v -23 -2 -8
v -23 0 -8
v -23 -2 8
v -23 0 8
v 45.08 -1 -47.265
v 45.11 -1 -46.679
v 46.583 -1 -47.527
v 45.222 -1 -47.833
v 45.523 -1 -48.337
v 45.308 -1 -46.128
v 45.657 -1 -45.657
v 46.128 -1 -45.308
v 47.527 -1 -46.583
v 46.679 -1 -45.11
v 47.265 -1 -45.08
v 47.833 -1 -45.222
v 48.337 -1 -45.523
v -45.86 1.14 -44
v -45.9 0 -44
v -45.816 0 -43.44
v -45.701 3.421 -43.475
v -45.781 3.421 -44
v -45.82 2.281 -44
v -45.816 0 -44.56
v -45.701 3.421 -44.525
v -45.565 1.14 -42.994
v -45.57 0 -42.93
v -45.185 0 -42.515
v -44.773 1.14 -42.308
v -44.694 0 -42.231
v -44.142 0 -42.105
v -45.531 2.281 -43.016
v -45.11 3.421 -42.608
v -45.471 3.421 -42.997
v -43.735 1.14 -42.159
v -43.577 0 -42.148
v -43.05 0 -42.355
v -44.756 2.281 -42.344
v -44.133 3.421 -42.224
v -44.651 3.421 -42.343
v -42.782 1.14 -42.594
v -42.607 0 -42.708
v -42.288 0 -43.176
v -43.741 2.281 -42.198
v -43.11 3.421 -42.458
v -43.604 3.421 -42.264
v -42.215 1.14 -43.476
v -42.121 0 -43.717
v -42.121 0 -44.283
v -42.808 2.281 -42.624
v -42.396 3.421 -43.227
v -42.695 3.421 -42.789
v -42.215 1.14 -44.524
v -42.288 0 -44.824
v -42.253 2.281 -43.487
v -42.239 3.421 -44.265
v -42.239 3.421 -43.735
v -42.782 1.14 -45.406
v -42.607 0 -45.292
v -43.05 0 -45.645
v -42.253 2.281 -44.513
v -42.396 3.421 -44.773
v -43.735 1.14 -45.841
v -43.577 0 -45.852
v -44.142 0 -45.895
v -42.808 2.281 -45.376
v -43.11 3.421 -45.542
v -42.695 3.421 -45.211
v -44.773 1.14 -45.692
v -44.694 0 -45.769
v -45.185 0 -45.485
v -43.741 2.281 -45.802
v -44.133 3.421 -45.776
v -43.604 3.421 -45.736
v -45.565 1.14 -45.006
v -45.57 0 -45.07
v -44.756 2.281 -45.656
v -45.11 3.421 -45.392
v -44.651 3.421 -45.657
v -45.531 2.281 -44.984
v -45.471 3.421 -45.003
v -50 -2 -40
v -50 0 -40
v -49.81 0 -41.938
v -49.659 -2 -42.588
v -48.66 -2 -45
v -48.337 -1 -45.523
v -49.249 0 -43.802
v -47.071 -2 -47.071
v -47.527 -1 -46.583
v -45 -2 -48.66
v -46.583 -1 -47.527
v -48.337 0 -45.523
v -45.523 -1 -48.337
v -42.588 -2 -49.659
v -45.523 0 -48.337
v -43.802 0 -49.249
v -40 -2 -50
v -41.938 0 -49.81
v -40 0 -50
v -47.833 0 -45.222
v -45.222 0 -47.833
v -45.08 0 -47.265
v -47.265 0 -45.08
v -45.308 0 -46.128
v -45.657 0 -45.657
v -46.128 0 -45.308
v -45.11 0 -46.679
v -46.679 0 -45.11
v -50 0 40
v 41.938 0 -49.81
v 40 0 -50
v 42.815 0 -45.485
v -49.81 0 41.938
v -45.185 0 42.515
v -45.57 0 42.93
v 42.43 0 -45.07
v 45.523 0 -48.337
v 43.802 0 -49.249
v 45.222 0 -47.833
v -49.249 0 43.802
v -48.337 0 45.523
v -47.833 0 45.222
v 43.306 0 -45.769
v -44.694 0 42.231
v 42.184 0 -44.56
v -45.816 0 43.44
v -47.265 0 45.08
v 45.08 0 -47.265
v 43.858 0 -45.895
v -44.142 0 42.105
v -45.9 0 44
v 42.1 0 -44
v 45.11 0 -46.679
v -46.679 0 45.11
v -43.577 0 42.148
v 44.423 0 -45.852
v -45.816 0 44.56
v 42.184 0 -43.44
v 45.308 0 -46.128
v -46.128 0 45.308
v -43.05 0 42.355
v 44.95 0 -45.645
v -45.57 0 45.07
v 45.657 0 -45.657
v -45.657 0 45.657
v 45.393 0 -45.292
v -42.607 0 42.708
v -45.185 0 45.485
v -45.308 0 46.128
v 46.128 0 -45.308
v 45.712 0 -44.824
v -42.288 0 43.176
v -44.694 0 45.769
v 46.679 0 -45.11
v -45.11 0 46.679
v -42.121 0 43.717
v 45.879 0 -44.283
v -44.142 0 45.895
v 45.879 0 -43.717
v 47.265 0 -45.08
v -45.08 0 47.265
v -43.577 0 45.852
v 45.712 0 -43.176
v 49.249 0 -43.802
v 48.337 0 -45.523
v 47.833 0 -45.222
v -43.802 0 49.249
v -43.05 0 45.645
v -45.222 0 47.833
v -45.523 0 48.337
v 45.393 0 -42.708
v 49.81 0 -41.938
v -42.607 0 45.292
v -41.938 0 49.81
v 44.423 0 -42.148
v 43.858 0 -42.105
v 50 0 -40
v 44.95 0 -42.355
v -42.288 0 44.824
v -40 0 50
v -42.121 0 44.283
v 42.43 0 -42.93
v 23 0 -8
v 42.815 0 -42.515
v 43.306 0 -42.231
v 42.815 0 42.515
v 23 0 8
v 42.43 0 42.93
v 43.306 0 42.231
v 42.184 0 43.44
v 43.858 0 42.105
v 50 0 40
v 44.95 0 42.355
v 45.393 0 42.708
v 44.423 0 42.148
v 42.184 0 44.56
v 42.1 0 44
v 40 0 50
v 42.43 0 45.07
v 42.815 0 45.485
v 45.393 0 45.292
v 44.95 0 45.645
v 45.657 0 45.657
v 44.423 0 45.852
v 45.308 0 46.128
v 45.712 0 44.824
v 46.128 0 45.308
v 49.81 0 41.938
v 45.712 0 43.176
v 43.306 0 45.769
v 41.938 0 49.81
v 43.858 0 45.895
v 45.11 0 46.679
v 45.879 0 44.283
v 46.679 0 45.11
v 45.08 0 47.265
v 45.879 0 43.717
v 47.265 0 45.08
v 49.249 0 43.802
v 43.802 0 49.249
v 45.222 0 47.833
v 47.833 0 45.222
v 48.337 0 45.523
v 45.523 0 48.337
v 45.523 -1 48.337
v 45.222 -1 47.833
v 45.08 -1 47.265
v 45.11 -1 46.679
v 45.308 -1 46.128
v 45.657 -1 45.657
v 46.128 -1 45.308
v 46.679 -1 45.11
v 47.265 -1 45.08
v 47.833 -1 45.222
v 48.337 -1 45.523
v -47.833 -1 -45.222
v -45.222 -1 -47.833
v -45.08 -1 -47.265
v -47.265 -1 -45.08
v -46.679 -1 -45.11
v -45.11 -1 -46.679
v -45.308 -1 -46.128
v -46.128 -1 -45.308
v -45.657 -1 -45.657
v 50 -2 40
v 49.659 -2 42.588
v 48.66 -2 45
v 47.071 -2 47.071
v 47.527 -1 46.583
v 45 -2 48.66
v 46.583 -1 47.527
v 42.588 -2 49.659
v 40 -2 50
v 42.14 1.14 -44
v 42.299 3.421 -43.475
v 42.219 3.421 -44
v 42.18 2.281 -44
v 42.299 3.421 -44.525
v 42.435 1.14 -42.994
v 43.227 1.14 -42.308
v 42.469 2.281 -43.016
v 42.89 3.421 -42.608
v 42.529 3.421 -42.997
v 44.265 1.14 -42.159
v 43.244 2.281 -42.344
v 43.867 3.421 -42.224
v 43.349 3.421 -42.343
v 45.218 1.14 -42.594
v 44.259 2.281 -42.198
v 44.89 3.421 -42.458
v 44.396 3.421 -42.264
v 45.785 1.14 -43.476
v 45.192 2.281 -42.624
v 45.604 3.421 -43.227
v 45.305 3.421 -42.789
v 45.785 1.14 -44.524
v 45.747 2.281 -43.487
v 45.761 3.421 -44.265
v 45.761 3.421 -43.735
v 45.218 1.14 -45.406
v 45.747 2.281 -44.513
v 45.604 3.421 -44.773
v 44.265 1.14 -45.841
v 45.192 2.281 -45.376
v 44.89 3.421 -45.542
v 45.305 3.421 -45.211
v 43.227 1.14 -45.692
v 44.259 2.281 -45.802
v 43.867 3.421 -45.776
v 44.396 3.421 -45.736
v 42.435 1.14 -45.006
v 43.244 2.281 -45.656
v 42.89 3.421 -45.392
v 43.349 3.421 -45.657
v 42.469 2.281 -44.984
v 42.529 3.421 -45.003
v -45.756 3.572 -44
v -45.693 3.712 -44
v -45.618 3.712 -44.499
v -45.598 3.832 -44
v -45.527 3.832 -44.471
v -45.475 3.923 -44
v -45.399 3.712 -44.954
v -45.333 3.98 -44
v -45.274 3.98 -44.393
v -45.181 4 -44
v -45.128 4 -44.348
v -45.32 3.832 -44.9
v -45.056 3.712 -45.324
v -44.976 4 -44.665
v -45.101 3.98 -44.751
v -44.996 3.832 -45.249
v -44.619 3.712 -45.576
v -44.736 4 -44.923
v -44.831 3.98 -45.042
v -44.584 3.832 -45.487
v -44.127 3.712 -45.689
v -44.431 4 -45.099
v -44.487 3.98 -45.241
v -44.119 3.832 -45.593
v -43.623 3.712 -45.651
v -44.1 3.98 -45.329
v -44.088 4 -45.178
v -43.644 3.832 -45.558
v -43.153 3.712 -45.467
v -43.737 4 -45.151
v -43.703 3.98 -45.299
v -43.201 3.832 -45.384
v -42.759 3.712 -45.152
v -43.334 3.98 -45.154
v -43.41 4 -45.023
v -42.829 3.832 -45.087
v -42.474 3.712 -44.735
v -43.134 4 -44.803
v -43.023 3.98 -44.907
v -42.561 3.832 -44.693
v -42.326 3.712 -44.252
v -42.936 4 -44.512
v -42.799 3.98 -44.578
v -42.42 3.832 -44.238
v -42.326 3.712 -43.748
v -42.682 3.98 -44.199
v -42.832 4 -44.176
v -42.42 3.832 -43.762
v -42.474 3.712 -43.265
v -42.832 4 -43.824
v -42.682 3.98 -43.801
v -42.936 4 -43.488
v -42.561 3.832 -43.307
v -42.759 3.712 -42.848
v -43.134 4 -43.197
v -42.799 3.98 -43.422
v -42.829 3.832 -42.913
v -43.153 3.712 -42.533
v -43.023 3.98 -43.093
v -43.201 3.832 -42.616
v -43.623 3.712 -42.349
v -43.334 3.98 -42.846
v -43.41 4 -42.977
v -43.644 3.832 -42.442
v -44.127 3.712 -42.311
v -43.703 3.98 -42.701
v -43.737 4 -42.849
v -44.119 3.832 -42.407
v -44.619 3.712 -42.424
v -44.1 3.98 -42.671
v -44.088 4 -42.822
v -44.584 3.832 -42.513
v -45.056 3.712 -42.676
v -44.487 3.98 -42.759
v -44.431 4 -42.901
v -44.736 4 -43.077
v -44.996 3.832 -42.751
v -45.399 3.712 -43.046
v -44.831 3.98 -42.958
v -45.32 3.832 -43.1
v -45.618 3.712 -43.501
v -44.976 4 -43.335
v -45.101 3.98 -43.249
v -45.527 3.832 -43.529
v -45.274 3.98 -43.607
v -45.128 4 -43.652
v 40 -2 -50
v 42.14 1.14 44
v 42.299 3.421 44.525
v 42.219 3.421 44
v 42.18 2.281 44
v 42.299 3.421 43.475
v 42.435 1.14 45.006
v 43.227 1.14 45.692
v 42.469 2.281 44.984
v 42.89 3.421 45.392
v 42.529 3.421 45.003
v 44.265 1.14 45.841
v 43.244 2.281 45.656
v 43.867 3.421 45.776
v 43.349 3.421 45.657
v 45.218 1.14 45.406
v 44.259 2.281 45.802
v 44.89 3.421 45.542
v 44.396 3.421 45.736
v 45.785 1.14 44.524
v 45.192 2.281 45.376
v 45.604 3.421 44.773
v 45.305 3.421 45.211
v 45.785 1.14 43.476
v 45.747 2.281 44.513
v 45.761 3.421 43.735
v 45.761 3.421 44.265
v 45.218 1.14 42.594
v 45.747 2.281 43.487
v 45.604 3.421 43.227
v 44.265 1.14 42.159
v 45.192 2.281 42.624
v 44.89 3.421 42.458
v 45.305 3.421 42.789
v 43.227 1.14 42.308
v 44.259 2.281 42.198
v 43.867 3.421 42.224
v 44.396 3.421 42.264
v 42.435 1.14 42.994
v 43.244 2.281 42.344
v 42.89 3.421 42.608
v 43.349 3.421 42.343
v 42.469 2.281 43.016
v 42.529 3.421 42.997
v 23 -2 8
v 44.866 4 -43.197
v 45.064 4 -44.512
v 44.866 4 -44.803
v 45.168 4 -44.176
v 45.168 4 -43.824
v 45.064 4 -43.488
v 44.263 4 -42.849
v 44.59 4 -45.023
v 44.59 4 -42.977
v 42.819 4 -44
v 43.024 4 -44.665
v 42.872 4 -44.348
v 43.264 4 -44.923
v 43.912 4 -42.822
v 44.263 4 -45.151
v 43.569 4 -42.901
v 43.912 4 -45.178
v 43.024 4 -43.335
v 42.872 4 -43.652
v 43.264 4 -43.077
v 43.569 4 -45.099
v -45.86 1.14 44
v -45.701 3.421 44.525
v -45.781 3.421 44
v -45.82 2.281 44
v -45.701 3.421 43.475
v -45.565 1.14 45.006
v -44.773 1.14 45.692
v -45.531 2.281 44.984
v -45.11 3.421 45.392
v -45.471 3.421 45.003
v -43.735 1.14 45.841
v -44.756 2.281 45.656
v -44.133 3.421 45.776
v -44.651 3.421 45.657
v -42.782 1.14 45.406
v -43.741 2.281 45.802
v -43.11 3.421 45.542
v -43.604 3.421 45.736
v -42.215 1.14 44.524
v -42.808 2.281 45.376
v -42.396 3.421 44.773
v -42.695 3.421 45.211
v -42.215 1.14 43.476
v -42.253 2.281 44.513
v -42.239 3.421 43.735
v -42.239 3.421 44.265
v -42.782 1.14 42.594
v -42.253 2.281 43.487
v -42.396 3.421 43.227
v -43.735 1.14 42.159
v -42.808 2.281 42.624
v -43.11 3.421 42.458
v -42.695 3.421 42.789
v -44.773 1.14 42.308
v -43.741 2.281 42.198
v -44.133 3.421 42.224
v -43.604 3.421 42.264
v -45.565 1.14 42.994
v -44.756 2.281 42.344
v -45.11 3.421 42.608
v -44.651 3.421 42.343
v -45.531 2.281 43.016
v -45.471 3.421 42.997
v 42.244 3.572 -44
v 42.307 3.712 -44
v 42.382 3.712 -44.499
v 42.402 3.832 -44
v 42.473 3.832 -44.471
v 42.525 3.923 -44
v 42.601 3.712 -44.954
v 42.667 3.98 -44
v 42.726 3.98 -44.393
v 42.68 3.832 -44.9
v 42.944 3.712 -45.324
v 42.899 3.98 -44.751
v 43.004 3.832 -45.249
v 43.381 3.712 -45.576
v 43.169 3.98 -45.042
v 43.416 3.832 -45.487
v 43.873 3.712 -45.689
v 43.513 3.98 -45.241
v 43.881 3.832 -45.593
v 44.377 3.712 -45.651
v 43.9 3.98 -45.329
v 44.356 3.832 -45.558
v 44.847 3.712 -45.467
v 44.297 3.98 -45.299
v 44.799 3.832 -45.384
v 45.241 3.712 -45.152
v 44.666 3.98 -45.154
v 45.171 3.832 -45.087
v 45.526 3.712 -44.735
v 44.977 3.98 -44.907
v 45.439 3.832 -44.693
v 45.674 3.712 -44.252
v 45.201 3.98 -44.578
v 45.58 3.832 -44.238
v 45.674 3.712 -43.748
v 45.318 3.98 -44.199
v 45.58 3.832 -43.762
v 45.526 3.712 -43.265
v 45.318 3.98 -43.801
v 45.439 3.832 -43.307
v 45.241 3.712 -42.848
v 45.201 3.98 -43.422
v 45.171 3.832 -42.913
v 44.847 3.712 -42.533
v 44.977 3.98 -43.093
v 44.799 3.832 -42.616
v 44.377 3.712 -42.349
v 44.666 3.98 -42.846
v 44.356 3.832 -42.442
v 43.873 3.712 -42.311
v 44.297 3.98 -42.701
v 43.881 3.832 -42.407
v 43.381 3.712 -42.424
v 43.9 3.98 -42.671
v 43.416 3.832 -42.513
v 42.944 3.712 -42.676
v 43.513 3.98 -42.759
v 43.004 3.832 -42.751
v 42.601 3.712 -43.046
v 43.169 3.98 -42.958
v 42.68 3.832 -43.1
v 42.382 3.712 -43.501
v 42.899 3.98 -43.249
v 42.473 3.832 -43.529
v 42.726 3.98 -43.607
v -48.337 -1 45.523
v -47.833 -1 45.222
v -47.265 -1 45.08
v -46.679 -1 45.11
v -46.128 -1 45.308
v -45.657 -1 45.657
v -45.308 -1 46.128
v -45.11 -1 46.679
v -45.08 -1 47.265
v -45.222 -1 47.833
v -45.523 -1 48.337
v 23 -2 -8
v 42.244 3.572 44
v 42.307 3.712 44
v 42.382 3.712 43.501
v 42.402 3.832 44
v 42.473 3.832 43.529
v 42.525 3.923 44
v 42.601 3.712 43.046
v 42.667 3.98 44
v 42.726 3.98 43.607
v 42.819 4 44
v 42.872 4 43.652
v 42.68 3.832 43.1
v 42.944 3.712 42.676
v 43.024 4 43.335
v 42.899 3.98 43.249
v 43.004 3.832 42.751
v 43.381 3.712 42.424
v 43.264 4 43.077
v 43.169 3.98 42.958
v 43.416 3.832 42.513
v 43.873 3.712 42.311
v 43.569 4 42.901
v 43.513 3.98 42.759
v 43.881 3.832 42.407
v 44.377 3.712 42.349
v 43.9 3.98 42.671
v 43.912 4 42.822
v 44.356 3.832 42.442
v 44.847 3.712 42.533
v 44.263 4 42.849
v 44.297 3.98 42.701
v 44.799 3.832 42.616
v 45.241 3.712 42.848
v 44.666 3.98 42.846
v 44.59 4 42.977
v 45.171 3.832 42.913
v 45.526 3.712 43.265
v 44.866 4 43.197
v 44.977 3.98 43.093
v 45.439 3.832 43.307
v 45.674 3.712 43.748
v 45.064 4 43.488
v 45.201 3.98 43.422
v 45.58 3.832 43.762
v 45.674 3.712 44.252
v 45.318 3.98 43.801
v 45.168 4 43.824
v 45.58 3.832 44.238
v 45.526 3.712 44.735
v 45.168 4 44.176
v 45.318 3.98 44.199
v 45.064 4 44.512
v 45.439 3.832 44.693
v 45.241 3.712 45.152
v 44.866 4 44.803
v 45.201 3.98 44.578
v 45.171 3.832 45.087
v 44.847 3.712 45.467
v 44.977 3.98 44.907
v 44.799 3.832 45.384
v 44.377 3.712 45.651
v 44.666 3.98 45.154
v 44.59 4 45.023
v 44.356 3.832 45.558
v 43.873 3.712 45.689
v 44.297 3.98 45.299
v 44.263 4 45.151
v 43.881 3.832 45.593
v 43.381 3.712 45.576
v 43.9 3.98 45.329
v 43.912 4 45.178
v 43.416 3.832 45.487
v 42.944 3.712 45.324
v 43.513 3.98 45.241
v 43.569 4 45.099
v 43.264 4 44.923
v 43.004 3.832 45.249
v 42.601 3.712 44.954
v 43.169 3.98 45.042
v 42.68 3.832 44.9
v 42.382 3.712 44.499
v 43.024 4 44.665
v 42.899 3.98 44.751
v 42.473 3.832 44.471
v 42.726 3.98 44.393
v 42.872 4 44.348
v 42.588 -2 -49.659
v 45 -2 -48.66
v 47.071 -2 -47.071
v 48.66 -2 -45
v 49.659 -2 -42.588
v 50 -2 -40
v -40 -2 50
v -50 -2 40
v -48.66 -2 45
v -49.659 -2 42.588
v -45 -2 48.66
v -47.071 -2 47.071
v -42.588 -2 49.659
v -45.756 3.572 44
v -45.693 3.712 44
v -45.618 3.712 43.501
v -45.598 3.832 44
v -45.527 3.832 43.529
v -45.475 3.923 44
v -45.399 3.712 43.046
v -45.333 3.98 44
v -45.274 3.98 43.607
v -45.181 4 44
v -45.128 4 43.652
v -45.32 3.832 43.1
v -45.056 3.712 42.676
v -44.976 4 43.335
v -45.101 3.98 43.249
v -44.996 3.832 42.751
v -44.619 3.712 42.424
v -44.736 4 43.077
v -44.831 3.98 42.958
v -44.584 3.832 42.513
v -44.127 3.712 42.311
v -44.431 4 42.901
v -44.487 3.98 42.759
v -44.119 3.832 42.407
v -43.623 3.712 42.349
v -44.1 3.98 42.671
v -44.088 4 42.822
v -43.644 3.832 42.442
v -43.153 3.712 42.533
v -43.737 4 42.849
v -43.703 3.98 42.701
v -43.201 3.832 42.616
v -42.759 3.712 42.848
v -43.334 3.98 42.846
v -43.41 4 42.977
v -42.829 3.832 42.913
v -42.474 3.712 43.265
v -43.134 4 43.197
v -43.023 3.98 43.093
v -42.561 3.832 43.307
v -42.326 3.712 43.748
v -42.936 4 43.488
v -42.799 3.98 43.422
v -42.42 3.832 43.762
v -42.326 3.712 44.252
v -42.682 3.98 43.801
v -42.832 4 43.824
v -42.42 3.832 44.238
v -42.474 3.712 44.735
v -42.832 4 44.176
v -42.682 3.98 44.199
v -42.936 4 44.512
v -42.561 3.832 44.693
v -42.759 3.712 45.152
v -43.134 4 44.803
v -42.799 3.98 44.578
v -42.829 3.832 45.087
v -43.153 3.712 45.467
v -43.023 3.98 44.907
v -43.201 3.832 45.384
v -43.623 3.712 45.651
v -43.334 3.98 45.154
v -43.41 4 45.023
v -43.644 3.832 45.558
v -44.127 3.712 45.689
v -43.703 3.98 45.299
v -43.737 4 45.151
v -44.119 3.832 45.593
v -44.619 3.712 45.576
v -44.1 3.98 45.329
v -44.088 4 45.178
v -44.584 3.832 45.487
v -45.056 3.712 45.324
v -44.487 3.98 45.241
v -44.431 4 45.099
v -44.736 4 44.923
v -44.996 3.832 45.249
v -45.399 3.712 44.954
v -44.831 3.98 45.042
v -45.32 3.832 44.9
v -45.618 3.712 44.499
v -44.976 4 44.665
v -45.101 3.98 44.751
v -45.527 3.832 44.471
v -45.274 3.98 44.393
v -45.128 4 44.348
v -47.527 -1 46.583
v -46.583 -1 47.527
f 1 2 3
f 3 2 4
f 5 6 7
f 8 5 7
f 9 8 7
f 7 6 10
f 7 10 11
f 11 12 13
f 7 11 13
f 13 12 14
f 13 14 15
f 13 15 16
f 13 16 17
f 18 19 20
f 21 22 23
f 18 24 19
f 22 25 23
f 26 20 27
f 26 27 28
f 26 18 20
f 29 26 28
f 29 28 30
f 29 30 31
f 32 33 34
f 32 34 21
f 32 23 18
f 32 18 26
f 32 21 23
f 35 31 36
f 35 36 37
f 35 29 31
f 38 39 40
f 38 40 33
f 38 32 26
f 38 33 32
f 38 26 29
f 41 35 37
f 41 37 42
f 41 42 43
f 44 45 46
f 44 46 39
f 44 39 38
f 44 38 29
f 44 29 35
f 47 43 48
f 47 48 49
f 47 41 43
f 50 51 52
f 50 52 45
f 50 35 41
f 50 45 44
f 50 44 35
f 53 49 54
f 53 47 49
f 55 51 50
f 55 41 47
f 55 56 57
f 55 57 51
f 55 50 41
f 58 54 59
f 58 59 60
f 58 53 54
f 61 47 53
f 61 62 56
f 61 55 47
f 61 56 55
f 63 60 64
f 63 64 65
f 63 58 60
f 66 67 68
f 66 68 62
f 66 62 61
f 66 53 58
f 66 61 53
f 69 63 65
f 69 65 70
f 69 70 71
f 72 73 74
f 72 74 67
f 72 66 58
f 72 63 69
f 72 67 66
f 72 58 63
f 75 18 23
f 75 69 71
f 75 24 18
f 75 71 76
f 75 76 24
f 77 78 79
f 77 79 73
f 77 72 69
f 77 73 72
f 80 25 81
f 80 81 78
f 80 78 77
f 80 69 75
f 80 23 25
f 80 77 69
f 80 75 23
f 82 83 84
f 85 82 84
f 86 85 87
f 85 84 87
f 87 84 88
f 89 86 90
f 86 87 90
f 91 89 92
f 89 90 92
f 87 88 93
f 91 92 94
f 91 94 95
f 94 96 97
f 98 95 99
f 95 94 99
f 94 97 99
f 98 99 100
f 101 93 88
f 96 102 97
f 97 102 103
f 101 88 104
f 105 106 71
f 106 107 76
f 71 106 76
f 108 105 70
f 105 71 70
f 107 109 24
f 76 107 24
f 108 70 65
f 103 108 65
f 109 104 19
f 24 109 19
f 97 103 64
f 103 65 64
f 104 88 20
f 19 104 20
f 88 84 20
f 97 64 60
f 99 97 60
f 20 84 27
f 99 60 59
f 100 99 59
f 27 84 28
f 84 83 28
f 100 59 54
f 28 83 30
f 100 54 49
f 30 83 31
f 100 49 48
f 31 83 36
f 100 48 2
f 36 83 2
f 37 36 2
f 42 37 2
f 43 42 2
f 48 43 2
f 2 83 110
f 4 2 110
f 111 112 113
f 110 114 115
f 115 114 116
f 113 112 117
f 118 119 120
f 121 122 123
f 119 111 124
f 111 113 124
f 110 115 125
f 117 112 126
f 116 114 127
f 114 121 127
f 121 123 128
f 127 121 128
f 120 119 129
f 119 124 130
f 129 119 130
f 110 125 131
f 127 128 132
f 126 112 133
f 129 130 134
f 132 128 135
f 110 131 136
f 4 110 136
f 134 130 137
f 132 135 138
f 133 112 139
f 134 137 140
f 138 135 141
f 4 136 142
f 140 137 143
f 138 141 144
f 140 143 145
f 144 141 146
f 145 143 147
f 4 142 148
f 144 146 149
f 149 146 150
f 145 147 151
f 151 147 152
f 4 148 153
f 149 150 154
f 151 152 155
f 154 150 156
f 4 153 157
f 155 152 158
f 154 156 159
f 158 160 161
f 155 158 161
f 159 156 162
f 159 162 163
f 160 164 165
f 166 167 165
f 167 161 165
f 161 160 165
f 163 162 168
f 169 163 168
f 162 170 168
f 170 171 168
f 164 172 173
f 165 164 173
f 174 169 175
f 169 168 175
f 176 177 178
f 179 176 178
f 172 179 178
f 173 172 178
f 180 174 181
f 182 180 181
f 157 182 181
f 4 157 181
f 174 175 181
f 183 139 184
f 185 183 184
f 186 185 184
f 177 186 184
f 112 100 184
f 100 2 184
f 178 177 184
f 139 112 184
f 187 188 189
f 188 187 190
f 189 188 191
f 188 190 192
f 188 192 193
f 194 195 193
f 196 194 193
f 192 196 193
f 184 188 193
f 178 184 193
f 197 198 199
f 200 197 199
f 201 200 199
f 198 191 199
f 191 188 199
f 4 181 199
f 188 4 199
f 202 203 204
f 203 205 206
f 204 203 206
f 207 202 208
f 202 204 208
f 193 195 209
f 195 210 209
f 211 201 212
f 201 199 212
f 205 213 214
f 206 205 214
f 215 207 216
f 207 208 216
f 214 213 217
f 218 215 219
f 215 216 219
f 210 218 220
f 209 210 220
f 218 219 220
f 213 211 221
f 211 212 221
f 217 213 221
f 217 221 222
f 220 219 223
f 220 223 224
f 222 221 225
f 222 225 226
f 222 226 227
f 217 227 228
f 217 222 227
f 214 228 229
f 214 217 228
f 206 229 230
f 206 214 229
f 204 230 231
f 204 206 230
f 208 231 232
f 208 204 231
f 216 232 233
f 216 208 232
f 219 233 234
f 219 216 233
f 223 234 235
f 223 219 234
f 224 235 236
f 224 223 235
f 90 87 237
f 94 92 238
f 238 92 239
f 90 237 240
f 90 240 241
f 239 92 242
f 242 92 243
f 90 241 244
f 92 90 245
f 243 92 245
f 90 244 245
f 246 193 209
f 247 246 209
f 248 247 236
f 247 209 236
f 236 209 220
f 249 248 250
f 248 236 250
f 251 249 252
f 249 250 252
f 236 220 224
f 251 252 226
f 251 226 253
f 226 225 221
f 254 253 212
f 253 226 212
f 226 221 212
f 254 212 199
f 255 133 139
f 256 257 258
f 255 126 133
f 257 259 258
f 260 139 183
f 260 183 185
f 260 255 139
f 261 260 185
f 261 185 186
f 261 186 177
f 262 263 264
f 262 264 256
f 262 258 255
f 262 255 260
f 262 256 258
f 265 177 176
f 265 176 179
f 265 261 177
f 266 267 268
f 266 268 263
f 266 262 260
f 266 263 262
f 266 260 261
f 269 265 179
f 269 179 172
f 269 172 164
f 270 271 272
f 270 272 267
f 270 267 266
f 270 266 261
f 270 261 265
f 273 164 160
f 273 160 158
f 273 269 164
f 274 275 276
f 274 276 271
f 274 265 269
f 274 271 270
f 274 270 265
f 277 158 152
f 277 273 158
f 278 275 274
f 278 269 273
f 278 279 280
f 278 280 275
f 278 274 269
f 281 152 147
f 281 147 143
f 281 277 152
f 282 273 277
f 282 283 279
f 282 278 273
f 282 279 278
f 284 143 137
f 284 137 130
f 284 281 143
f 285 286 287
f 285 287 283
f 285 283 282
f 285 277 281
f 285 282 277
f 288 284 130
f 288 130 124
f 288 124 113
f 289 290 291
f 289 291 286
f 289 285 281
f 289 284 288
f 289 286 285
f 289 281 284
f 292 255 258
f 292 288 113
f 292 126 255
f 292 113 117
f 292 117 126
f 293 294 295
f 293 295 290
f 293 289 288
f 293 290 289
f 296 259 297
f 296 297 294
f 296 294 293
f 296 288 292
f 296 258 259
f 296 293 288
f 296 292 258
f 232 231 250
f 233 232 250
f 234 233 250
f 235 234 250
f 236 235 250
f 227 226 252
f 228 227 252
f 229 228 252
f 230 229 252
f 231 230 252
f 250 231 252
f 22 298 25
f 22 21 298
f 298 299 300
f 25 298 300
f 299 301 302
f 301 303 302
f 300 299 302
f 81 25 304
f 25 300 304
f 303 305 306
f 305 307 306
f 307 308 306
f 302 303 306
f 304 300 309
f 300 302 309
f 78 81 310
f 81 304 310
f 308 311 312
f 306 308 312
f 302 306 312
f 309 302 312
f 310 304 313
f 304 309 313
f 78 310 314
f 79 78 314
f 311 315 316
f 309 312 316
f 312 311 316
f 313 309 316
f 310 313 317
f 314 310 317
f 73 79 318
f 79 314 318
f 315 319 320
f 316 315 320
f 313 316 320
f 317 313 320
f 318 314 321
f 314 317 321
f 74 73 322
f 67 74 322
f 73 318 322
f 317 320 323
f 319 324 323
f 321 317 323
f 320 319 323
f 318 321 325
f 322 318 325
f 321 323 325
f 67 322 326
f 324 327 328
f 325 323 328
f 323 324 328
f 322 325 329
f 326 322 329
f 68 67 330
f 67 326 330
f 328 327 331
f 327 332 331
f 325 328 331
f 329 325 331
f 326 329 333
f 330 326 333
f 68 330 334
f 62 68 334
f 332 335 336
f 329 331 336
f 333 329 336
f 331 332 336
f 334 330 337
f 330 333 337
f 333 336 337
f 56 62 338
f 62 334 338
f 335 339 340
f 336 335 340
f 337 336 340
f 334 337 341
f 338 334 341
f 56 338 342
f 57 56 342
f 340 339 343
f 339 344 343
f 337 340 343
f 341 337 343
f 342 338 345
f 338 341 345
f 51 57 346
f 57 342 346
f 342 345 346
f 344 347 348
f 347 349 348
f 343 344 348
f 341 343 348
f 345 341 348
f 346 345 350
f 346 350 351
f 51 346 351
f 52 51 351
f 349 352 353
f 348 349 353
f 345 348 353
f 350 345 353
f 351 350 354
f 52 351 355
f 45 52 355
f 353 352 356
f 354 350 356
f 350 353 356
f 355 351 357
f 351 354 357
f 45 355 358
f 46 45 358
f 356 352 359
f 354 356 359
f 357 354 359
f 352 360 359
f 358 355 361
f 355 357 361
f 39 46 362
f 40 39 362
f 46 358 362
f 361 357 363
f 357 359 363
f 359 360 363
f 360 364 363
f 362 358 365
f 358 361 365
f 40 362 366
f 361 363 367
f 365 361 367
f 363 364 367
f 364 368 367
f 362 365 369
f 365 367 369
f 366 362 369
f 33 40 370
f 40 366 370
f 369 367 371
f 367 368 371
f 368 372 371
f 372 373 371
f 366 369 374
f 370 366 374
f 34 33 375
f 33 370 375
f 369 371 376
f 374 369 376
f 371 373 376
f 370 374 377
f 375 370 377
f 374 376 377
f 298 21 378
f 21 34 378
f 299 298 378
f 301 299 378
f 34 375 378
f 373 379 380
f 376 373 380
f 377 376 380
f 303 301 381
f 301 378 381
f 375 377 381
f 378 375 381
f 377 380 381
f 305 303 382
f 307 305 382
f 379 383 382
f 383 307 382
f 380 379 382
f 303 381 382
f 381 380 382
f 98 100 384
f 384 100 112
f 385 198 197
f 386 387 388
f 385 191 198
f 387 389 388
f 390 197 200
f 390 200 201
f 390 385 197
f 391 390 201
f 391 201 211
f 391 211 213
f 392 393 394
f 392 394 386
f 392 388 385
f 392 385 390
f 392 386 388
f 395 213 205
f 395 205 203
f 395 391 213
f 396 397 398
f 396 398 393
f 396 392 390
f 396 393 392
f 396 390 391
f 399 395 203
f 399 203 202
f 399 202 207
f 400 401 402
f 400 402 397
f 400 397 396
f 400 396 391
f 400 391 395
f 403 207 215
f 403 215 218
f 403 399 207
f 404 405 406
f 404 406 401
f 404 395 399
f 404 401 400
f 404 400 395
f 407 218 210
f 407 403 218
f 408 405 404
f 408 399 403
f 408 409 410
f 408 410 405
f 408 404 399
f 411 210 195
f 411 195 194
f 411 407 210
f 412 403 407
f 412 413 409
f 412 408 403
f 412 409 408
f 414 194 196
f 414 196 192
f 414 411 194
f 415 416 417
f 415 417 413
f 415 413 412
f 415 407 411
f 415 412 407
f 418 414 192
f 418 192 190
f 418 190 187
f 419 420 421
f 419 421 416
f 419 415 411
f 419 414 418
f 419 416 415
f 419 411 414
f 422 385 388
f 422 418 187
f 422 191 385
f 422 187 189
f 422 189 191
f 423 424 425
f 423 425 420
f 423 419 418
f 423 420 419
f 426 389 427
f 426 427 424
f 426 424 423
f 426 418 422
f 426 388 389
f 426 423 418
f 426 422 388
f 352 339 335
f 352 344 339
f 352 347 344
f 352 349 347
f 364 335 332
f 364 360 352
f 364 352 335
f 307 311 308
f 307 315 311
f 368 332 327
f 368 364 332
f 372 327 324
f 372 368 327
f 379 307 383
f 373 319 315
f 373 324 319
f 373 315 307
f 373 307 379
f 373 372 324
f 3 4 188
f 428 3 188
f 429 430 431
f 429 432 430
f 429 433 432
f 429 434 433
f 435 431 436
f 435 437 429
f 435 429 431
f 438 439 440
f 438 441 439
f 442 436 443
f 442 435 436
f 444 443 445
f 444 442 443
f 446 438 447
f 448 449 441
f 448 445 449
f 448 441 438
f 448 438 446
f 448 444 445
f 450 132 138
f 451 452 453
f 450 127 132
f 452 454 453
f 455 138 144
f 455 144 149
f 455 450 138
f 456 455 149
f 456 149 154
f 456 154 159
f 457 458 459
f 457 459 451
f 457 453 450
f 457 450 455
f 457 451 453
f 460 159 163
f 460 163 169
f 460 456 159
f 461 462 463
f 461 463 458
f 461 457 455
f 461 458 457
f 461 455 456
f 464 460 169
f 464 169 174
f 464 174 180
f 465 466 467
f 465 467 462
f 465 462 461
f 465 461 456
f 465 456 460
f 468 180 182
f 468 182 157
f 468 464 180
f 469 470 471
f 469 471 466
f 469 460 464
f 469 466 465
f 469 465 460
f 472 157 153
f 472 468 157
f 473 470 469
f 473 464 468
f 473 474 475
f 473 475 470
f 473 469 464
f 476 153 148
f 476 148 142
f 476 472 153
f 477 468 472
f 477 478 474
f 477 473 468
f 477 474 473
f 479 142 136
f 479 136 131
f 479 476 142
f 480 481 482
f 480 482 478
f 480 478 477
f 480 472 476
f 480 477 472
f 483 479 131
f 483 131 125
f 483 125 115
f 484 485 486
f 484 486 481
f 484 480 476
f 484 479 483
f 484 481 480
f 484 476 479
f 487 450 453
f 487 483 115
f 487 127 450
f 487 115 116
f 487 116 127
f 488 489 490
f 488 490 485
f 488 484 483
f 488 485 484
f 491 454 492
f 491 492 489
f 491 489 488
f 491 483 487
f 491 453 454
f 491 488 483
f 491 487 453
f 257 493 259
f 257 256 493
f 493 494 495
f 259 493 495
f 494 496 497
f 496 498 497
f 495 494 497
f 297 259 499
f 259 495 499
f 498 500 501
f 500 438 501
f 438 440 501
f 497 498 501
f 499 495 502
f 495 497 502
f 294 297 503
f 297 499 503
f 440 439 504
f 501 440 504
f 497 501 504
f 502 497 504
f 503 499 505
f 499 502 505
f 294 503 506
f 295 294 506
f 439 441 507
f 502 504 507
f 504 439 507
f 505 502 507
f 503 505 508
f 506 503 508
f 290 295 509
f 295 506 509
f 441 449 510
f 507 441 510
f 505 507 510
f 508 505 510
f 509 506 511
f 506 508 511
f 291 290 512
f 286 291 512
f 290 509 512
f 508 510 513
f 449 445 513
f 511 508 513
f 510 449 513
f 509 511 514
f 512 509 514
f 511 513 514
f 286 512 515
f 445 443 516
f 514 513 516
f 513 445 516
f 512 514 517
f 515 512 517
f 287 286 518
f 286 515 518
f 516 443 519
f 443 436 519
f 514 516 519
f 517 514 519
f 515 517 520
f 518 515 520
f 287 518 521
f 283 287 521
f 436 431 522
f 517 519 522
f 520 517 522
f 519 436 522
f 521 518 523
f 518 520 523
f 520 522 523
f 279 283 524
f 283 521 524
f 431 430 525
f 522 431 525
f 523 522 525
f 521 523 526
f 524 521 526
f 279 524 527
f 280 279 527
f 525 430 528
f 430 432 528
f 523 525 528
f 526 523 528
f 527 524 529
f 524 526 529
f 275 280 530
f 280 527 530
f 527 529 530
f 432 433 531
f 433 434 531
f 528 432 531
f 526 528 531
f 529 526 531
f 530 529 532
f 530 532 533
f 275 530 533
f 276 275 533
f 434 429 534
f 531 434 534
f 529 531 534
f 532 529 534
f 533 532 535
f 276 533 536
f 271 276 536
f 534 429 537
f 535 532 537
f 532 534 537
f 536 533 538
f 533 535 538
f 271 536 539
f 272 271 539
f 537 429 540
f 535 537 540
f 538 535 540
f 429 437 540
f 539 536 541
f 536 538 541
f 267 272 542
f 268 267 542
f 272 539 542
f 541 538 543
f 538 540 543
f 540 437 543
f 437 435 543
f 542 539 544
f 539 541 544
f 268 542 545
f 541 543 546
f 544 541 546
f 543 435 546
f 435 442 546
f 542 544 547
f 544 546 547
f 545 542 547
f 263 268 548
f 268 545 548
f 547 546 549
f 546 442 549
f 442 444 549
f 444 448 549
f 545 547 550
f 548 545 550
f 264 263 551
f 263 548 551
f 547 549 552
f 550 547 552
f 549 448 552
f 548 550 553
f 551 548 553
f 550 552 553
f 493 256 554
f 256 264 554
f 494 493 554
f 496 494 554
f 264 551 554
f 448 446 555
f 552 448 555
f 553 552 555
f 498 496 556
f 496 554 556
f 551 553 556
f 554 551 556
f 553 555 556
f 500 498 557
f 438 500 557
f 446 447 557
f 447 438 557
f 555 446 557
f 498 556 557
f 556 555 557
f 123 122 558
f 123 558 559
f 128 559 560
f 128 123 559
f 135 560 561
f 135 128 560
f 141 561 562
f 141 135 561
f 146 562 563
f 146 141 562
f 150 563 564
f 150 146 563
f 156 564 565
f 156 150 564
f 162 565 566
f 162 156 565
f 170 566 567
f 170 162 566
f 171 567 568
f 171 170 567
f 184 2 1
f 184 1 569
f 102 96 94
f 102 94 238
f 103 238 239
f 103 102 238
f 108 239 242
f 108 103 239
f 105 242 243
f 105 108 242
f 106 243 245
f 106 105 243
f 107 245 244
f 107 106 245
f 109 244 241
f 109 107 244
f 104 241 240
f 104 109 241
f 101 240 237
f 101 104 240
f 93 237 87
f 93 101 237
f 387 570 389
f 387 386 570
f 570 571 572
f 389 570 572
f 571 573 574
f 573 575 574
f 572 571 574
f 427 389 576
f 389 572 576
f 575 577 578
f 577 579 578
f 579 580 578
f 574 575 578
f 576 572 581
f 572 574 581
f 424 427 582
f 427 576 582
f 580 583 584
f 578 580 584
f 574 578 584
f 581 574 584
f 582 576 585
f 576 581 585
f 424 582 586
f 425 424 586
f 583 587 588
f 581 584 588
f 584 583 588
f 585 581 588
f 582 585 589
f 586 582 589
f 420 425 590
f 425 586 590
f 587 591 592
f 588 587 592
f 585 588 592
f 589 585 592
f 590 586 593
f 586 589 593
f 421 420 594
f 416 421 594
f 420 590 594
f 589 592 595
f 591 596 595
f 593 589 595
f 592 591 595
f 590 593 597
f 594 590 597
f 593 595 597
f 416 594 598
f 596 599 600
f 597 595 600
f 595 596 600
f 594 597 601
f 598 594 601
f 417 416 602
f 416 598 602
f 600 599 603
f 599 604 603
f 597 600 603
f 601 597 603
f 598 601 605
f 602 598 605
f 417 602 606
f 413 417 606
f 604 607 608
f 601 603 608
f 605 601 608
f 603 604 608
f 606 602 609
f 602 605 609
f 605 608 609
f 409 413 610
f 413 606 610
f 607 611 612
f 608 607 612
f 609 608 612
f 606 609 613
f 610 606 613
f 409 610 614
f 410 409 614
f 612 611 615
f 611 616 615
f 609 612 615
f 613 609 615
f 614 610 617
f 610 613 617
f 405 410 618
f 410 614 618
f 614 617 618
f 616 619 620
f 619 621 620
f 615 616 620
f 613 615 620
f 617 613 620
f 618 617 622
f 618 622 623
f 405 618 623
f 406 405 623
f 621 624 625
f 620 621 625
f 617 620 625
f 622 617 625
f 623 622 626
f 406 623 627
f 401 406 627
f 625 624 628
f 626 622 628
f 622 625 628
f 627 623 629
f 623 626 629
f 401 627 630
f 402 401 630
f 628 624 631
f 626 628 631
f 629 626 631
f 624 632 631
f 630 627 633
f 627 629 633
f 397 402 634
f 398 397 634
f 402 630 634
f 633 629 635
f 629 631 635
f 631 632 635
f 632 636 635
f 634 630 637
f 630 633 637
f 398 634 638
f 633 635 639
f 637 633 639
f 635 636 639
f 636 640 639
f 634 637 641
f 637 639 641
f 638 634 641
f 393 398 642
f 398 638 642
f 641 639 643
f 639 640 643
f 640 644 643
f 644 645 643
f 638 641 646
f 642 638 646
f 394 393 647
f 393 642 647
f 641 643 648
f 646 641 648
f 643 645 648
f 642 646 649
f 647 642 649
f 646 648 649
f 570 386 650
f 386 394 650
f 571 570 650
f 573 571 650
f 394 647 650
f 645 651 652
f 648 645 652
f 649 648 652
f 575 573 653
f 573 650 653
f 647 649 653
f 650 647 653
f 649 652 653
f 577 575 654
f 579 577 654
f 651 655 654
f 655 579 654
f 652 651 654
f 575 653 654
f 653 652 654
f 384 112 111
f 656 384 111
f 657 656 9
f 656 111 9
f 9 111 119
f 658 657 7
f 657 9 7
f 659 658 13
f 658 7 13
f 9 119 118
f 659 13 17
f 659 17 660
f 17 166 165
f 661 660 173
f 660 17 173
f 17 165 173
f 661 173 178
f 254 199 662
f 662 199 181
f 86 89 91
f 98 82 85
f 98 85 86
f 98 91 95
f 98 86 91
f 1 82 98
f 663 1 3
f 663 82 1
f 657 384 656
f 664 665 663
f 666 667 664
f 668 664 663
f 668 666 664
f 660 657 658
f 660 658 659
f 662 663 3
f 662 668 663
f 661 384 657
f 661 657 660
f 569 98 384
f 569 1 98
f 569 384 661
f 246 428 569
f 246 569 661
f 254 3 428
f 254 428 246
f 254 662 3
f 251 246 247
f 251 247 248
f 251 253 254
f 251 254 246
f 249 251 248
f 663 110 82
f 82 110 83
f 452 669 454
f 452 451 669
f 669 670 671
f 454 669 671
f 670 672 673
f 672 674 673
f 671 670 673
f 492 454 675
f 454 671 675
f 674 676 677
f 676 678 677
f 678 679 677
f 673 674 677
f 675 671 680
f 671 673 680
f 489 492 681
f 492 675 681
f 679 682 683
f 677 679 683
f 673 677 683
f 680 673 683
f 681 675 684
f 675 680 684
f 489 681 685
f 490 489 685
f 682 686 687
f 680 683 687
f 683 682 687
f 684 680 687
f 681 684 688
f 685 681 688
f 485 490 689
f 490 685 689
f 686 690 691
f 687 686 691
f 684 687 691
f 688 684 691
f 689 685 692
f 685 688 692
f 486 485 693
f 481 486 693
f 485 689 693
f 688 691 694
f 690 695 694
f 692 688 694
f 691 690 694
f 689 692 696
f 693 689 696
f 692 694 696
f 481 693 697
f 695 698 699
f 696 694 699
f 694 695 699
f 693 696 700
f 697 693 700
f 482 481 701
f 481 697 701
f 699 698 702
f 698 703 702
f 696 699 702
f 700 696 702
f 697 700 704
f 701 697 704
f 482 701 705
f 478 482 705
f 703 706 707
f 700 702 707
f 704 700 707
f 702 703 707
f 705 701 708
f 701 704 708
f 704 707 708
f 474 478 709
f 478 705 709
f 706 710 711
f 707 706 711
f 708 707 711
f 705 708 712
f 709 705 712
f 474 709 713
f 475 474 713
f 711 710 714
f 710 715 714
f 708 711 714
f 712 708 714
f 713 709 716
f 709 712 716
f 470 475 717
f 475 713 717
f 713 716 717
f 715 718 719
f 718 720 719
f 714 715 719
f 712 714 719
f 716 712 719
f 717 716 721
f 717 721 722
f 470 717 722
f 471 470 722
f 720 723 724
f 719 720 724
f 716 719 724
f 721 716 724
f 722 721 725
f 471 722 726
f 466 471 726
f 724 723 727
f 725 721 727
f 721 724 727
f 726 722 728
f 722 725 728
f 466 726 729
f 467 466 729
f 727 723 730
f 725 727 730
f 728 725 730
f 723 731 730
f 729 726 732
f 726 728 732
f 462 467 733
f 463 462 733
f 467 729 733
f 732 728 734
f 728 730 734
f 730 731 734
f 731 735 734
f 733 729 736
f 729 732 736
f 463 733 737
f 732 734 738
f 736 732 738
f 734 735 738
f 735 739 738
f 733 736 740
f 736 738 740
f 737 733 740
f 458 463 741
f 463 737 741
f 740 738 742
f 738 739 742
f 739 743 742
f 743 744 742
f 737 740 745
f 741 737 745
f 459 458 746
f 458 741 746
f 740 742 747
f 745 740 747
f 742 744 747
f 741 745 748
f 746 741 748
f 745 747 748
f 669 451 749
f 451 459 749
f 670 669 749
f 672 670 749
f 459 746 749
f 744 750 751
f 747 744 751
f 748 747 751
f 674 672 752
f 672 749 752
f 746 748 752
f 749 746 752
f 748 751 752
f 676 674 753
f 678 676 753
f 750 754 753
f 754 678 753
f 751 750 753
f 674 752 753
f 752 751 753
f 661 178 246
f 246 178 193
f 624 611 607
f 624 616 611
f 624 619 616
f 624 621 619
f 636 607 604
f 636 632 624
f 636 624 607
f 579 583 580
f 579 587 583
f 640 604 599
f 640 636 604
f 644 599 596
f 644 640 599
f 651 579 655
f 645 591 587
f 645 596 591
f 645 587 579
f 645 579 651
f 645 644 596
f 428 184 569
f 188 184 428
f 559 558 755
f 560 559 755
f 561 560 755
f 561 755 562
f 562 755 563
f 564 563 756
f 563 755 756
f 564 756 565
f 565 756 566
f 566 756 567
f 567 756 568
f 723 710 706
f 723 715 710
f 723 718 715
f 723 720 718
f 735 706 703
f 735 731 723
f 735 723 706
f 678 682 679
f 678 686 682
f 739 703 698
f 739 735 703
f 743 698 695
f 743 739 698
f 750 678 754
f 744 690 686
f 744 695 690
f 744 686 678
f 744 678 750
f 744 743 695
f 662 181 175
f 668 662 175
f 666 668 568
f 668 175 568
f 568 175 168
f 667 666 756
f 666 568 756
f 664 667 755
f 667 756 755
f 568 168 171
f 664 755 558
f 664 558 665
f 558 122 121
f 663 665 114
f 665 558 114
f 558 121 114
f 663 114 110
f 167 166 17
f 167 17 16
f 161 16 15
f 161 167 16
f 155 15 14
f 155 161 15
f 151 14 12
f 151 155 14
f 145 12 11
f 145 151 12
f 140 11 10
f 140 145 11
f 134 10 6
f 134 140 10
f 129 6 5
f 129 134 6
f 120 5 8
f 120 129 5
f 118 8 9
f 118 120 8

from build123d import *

# Parameters (mm, degrees)
F0_W     = 46
F0_H     = 16
F1_DEPTH = 2
F2_R     = 1.9
F3_DEPTH = 4
F3_TAPER = 2
F5_DEPTH = 1
F6_R     = 0.6


# Not quite as in the source:
# - a feature names something its author has since deleted; it is built from what else it names


with BuildPart() as f1:
    # F0 (on Front) → F1 (new body)
    with BuildSketch(Plane.XZ):
        Polygon((-40, -50), (40, -50), (40, -40), (50, -40), (50, 40), (40, 40), (40, 50), (-40, 50), (-40, 40), (-50, 40), (-50, -40), (-40, -40), align=None)
        Rectangle(F0_W, F0_H, mode=Mode.SUBTRACT)
        with BuildLine():
            Line((40, -40), (40, -50))
            ThreePointArc((40, -50), (47.0710678119, -47.0710678119), (50, -40))
            Line((50, -40), (40, -40))
        make_face()
        with BuildLine():
            ThreePointArc((-50, -40), (-47.0710678119, -47.0710678119), (-40, -50))
            Line((-40, -50), (-40, -40))
            Line((-40, -40), (-50, -40))
        make_face()
        with BuildLine():
            Line((40, 40), (50, 40))
            ThreePointArc((50, 40), (47.0710678119, 47.0710678119), (40, 50))
            Line((40, 50), (40, 40))
        make_face()
        with BuildLine():
            ThreePointArc((-40, 50), (-47.0710678119, 47.0710678119), (-50, 40))
            Line((-50, 40), (-40, 40))
            Line((-40, 40), (-40, 50))
        make_face()
    extrude(amount=F1_DEPTH)

    # F2 (on face) → F3 (join)
    with BuildSketch(Plane(origin=(0, 0, 0), x_dir=(-1, 0, 0), z_dir=(0, 1, 0))):
        with Locations((-44, 44)):
            Circle(F2_R)
        with Locations((44, 44)):
            Circle(F2_R)
        with Locations((-44, -44)):
            Circle(F2_R)
        with Locations((44, -44)):
            Circle(F2_R)
    extrude(amount=F3_DEPTH, taper=F3_TAPER)

    # F4 (on face) → F5 (cut)
    with BuildSketch(Plane.XZ):
        with BuildLine():
            ThreePointArc((48.3367711836, 45.5225217277), (47.0710678119, 47.0710678119), (45.5225217277, 48.3367711836))
            ThreePointArc((45.5225217277, 48.3367711836), (45.6568542495, 45.6568542495), (48.3367711836, 45.5225217277))
        make_face()
        with BuildLine():
            ThreePointArc((-48.3367711836, 45.5225217277), (-45.6568542495, 45.6568542495), (-45.5225217277, 48.3367711836))
            ThreePointArc((-45.5225217277, 48.3367711836), (-47.0710678119, 47.0710678119), (-48.3367711836, 45.5225217277))
        make_face()
        with BuildLine():
            ThreePointArc((-48.3367711836, -45.5225217277), (-47.0710678119, -47.0710678119), (-45.5225217277, -48.3367711836))
            ThreePointArc((-45.5225217277, -48.3367711836), (-45.6568542495, -45.6568542495), (-48.3367711836, -45.5225217277))
        make_face()
        with BuildLine():
            ThreePointArc((48.3367711836, -45.5225217277), (45.6568542495, -45.6568542495), (45.5225217277, -48.3367711836))
            ThreePointArc((45.5225217277, -48.3367711836), (47.0710678119, -47.0710678119), (48.3367711836, -45.5225217277))
        make_face()
    extrude(amount=F5_DEPTH, mode=Mode.SUBTRACT)

    # F6
    f6_edges = [f1.edges().sort_by_distance(p)[0] for p in [
        (45.760317, 4, 44),
        (45.760317, 4, -44),
        (-42.239683, 4, 44),
        (-42.239683, 4, -44),
    ]]
    fillet(f6_edges, radius=F6_R)


solid = f1.part
